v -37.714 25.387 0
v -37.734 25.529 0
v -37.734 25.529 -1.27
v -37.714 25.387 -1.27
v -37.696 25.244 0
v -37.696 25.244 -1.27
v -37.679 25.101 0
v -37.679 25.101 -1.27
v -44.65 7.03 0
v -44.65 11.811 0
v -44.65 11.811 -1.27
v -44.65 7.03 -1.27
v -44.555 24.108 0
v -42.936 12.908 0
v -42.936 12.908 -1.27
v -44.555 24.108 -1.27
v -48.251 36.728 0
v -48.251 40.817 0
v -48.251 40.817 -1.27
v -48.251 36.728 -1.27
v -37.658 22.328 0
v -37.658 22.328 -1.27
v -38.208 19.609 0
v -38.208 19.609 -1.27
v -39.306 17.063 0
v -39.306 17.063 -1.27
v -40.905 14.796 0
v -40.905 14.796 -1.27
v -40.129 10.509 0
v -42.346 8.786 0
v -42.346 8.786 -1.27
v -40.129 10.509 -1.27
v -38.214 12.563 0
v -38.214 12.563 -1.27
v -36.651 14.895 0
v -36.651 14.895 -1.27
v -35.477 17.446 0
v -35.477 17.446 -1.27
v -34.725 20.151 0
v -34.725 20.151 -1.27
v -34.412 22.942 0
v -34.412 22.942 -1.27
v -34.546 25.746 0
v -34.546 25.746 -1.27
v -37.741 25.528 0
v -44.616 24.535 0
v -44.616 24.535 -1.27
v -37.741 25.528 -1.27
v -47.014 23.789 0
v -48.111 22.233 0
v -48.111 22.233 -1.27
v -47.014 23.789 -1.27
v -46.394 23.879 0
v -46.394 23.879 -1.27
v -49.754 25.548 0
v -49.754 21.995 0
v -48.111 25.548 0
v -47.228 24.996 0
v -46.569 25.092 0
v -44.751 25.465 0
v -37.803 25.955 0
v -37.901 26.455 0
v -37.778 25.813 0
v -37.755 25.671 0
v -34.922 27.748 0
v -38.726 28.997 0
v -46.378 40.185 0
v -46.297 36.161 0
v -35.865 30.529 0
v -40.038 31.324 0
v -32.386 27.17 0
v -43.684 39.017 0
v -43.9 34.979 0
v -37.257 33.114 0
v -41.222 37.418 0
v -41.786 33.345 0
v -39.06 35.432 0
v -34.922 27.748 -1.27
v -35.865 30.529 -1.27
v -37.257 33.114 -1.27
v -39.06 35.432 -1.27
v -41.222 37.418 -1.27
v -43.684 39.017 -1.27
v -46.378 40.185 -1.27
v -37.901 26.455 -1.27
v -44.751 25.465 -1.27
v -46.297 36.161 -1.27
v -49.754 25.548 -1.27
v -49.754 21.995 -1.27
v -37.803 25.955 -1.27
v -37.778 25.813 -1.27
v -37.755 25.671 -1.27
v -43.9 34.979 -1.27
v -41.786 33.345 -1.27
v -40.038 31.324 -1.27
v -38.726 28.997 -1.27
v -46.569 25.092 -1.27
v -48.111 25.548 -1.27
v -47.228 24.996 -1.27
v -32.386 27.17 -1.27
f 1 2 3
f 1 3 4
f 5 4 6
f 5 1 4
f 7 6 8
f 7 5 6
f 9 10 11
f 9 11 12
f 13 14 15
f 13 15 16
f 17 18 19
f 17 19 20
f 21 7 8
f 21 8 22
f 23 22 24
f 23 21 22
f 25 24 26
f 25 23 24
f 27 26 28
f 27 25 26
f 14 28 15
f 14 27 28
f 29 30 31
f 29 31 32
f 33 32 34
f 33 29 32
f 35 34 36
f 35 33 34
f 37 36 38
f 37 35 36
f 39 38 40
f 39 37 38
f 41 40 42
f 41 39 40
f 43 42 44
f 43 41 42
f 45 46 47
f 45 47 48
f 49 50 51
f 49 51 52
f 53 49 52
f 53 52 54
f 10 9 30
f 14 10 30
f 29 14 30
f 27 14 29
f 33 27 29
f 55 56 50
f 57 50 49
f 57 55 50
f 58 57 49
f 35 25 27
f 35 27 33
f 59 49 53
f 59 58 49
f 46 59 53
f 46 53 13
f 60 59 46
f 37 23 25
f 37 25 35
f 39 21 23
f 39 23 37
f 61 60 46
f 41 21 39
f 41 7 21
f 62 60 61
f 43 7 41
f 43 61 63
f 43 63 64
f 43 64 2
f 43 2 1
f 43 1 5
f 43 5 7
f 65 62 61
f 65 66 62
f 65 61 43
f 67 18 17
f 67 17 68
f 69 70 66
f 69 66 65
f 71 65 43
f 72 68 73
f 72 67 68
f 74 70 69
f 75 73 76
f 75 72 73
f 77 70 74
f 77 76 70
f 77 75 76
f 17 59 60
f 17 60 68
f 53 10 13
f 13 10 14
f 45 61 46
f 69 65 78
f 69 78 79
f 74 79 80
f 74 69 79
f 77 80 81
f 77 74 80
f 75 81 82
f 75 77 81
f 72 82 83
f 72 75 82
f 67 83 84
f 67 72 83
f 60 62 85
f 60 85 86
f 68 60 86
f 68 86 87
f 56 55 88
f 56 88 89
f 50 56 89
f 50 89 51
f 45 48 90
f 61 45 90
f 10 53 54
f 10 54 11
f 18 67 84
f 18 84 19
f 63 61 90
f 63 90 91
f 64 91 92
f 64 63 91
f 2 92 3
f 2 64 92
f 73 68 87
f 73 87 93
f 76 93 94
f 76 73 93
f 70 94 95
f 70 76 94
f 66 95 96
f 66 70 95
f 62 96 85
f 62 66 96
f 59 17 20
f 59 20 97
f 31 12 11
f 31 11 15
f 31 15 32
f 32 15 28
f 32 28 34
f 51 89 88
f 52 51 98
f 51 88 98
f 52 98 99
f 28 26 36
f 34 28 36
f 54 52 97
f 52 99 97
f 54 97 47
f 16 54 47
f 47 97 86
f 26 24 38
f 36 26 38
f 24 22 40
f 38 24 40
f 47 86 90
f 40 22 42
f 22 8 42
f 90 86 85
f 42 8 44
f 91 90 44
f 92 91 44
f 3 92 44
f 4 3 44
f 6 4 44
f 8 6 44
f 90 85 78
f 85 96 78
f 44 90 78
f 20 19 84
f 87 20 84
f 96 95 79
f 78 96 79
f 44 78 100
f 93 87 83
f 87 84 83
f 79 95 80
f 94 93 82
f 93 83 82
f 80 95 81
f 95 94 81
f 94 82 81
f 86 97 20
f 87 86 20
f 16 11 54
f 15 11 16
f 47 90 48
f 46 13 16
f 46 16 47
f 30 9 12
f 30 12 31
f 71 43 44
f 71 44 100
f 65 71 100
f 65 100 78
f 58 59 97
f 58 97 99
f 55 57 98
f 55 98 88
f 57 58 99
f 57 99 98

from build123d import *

# Parameters (mm, degrees)
F1_DEPTH = 1.27


with BuildPart() as f1:
    # F0 (on Top) → F1 (new body)
    with BuildSketch(Plane.XY):
        with BuildLine():
            Line((-44.650044, 11.810658), (-42.345528, 8.785976))
            ThreePointArc((-42.345528, 8.785976), (-36.013085, 16.14737), (-34.54626, 25.746243))
            ThreePointArc((-34.54626, 25.746243), (-34.705251, 26.752672), (-34.922194, 27.748218))
            ThreePointArc((-34.922194, 27.748218), (-39.059576, 35.431946), (-46.378434, 40.185042))
            Line((-46.378434, 40.185042), (-48.250854, 36.728263))
            ThreePointArc((-48.250854, 36.728263), (-47.262902, 36.481943), (-46.296505, 36.161318))
            ThreePointArc((-46.296505, 36.161318), (-40.861402, 32.378631), (-37.901269, 26.455229))
            ThreePointArc((-37.901269, 26.455229), (-37.849542, 26.205506), (-37.802577, 25.954845))
            ThreePointArc((-37.802577, 25.954845), (-37.766593, 25.742227), (-37.734035, 25.529058))
            ThreePointArc((-37.734035, 25.529058), (-37.704911, 25.315392), (-37.67923, 25.101285))
            ThreePointArc((-37.67923, 25.101285), (-38.69112, 18.30755), (-42.936155, 12.907694))
            ThreePointArc((-42.936155, 12.907694), (-43.772245, 12.326595), (-44.650044, 11.810658))
        make_face()
        with BuildLine():
            Line((-46.39398, 23.878697), (-44.650044, 11.810658))
            ThreePointArc((-44.650044, 11.810658), (-43.772245, 12.326595), (-42.936155, 12.907694))
            Line((-42.936155, 12.907694), (-44.554657, 24.107726))
            Line((-44.554657, 24.107726), (-44.61633, 24.534506))
            Line((-44.61633, 24.534506), (-46.488751, 24.534506))
            Line((-46.488751, 24.534506), (-46.39398, 23.878697))
        make_face()
        with BuildLine():
            Line((-46.569266, 25.091674), (-46.488751, 24.534506))
            Line((-46.488751, 24.534506), (-44.61633, 24.534506))
            Line((-44.61633, 24.534506), (-44.678004, 24.961286))
            Line((-44.678004, 24.961286), (-44.750853, 25.465404))
            Line((-44.750853, 25.465404), (-46.296505, 36.161318))
            ThreePointArc((-46.296505, 36.161318), (-47.262902, 36.481943), (-48.250854, 36.728263))
            Line((-48.250854, 36.728263), (-46.569266, 25.091674))
        make_face()
        Polygon((-47.014023, 23.789095), (-46.488751, 24.534506), (-47.228107, 24.996466), (-48.110645, 25.547888), (-49.754124, 25.547888), (-49.754124, 23.612555), (-49.754124, 21.995388), (-48.110645, 22.232885), align=None)
        with BuildLine():
            ThreePointArc((-34.922194, 27.748218), (-34.705251, 26.752672), (-34.54626, 25.746243))
            Line((-34.54626, 25.746243), (-32.386307, 27.169833))
            Line((-32.386307, 27.169833), (-34.922194, 27.748218))
        make_face()
        Polygon((-44.650044, 7.030156), (-42.345528, 8.785976), (-44.650044, 11.810658), align=None)
        Polygon((-48.250854, 36.728263), (-46.378434, 40.185042), (-48.250854, 40.817065), align=None)
        with BuildLine():
            Line((-44.678004, 24.961286), (-37.802577, 25.954845))
            ThreePointArc((-37.802577, 25.954845), (-37.849542, 26.205506), (-37.901269, 26.455229))
            Line((-37.901269, 26.455229), (-44.750853, 25.465404))
            Line((-44.750853, 25.465404), (-44.678004, 24.961286))
        make_face()
        Polygon((-44.61633, 24.534506), (-37.740904, 25.528065), (-37.802577, 25.954845), (-44.678004, 24.961286), align=None)
        Polygon((-47.228107, 24.996466), (-46.488751, 24.534506), (-46.569266, 25.091674), align=None)
        Polygon((-47.014023, 23.789095), (-46.39398, 23.878697), (-46.488751, 24.534506), align=None)
    extrude(amount=-F1_DEPTH)


solid = f1.part
